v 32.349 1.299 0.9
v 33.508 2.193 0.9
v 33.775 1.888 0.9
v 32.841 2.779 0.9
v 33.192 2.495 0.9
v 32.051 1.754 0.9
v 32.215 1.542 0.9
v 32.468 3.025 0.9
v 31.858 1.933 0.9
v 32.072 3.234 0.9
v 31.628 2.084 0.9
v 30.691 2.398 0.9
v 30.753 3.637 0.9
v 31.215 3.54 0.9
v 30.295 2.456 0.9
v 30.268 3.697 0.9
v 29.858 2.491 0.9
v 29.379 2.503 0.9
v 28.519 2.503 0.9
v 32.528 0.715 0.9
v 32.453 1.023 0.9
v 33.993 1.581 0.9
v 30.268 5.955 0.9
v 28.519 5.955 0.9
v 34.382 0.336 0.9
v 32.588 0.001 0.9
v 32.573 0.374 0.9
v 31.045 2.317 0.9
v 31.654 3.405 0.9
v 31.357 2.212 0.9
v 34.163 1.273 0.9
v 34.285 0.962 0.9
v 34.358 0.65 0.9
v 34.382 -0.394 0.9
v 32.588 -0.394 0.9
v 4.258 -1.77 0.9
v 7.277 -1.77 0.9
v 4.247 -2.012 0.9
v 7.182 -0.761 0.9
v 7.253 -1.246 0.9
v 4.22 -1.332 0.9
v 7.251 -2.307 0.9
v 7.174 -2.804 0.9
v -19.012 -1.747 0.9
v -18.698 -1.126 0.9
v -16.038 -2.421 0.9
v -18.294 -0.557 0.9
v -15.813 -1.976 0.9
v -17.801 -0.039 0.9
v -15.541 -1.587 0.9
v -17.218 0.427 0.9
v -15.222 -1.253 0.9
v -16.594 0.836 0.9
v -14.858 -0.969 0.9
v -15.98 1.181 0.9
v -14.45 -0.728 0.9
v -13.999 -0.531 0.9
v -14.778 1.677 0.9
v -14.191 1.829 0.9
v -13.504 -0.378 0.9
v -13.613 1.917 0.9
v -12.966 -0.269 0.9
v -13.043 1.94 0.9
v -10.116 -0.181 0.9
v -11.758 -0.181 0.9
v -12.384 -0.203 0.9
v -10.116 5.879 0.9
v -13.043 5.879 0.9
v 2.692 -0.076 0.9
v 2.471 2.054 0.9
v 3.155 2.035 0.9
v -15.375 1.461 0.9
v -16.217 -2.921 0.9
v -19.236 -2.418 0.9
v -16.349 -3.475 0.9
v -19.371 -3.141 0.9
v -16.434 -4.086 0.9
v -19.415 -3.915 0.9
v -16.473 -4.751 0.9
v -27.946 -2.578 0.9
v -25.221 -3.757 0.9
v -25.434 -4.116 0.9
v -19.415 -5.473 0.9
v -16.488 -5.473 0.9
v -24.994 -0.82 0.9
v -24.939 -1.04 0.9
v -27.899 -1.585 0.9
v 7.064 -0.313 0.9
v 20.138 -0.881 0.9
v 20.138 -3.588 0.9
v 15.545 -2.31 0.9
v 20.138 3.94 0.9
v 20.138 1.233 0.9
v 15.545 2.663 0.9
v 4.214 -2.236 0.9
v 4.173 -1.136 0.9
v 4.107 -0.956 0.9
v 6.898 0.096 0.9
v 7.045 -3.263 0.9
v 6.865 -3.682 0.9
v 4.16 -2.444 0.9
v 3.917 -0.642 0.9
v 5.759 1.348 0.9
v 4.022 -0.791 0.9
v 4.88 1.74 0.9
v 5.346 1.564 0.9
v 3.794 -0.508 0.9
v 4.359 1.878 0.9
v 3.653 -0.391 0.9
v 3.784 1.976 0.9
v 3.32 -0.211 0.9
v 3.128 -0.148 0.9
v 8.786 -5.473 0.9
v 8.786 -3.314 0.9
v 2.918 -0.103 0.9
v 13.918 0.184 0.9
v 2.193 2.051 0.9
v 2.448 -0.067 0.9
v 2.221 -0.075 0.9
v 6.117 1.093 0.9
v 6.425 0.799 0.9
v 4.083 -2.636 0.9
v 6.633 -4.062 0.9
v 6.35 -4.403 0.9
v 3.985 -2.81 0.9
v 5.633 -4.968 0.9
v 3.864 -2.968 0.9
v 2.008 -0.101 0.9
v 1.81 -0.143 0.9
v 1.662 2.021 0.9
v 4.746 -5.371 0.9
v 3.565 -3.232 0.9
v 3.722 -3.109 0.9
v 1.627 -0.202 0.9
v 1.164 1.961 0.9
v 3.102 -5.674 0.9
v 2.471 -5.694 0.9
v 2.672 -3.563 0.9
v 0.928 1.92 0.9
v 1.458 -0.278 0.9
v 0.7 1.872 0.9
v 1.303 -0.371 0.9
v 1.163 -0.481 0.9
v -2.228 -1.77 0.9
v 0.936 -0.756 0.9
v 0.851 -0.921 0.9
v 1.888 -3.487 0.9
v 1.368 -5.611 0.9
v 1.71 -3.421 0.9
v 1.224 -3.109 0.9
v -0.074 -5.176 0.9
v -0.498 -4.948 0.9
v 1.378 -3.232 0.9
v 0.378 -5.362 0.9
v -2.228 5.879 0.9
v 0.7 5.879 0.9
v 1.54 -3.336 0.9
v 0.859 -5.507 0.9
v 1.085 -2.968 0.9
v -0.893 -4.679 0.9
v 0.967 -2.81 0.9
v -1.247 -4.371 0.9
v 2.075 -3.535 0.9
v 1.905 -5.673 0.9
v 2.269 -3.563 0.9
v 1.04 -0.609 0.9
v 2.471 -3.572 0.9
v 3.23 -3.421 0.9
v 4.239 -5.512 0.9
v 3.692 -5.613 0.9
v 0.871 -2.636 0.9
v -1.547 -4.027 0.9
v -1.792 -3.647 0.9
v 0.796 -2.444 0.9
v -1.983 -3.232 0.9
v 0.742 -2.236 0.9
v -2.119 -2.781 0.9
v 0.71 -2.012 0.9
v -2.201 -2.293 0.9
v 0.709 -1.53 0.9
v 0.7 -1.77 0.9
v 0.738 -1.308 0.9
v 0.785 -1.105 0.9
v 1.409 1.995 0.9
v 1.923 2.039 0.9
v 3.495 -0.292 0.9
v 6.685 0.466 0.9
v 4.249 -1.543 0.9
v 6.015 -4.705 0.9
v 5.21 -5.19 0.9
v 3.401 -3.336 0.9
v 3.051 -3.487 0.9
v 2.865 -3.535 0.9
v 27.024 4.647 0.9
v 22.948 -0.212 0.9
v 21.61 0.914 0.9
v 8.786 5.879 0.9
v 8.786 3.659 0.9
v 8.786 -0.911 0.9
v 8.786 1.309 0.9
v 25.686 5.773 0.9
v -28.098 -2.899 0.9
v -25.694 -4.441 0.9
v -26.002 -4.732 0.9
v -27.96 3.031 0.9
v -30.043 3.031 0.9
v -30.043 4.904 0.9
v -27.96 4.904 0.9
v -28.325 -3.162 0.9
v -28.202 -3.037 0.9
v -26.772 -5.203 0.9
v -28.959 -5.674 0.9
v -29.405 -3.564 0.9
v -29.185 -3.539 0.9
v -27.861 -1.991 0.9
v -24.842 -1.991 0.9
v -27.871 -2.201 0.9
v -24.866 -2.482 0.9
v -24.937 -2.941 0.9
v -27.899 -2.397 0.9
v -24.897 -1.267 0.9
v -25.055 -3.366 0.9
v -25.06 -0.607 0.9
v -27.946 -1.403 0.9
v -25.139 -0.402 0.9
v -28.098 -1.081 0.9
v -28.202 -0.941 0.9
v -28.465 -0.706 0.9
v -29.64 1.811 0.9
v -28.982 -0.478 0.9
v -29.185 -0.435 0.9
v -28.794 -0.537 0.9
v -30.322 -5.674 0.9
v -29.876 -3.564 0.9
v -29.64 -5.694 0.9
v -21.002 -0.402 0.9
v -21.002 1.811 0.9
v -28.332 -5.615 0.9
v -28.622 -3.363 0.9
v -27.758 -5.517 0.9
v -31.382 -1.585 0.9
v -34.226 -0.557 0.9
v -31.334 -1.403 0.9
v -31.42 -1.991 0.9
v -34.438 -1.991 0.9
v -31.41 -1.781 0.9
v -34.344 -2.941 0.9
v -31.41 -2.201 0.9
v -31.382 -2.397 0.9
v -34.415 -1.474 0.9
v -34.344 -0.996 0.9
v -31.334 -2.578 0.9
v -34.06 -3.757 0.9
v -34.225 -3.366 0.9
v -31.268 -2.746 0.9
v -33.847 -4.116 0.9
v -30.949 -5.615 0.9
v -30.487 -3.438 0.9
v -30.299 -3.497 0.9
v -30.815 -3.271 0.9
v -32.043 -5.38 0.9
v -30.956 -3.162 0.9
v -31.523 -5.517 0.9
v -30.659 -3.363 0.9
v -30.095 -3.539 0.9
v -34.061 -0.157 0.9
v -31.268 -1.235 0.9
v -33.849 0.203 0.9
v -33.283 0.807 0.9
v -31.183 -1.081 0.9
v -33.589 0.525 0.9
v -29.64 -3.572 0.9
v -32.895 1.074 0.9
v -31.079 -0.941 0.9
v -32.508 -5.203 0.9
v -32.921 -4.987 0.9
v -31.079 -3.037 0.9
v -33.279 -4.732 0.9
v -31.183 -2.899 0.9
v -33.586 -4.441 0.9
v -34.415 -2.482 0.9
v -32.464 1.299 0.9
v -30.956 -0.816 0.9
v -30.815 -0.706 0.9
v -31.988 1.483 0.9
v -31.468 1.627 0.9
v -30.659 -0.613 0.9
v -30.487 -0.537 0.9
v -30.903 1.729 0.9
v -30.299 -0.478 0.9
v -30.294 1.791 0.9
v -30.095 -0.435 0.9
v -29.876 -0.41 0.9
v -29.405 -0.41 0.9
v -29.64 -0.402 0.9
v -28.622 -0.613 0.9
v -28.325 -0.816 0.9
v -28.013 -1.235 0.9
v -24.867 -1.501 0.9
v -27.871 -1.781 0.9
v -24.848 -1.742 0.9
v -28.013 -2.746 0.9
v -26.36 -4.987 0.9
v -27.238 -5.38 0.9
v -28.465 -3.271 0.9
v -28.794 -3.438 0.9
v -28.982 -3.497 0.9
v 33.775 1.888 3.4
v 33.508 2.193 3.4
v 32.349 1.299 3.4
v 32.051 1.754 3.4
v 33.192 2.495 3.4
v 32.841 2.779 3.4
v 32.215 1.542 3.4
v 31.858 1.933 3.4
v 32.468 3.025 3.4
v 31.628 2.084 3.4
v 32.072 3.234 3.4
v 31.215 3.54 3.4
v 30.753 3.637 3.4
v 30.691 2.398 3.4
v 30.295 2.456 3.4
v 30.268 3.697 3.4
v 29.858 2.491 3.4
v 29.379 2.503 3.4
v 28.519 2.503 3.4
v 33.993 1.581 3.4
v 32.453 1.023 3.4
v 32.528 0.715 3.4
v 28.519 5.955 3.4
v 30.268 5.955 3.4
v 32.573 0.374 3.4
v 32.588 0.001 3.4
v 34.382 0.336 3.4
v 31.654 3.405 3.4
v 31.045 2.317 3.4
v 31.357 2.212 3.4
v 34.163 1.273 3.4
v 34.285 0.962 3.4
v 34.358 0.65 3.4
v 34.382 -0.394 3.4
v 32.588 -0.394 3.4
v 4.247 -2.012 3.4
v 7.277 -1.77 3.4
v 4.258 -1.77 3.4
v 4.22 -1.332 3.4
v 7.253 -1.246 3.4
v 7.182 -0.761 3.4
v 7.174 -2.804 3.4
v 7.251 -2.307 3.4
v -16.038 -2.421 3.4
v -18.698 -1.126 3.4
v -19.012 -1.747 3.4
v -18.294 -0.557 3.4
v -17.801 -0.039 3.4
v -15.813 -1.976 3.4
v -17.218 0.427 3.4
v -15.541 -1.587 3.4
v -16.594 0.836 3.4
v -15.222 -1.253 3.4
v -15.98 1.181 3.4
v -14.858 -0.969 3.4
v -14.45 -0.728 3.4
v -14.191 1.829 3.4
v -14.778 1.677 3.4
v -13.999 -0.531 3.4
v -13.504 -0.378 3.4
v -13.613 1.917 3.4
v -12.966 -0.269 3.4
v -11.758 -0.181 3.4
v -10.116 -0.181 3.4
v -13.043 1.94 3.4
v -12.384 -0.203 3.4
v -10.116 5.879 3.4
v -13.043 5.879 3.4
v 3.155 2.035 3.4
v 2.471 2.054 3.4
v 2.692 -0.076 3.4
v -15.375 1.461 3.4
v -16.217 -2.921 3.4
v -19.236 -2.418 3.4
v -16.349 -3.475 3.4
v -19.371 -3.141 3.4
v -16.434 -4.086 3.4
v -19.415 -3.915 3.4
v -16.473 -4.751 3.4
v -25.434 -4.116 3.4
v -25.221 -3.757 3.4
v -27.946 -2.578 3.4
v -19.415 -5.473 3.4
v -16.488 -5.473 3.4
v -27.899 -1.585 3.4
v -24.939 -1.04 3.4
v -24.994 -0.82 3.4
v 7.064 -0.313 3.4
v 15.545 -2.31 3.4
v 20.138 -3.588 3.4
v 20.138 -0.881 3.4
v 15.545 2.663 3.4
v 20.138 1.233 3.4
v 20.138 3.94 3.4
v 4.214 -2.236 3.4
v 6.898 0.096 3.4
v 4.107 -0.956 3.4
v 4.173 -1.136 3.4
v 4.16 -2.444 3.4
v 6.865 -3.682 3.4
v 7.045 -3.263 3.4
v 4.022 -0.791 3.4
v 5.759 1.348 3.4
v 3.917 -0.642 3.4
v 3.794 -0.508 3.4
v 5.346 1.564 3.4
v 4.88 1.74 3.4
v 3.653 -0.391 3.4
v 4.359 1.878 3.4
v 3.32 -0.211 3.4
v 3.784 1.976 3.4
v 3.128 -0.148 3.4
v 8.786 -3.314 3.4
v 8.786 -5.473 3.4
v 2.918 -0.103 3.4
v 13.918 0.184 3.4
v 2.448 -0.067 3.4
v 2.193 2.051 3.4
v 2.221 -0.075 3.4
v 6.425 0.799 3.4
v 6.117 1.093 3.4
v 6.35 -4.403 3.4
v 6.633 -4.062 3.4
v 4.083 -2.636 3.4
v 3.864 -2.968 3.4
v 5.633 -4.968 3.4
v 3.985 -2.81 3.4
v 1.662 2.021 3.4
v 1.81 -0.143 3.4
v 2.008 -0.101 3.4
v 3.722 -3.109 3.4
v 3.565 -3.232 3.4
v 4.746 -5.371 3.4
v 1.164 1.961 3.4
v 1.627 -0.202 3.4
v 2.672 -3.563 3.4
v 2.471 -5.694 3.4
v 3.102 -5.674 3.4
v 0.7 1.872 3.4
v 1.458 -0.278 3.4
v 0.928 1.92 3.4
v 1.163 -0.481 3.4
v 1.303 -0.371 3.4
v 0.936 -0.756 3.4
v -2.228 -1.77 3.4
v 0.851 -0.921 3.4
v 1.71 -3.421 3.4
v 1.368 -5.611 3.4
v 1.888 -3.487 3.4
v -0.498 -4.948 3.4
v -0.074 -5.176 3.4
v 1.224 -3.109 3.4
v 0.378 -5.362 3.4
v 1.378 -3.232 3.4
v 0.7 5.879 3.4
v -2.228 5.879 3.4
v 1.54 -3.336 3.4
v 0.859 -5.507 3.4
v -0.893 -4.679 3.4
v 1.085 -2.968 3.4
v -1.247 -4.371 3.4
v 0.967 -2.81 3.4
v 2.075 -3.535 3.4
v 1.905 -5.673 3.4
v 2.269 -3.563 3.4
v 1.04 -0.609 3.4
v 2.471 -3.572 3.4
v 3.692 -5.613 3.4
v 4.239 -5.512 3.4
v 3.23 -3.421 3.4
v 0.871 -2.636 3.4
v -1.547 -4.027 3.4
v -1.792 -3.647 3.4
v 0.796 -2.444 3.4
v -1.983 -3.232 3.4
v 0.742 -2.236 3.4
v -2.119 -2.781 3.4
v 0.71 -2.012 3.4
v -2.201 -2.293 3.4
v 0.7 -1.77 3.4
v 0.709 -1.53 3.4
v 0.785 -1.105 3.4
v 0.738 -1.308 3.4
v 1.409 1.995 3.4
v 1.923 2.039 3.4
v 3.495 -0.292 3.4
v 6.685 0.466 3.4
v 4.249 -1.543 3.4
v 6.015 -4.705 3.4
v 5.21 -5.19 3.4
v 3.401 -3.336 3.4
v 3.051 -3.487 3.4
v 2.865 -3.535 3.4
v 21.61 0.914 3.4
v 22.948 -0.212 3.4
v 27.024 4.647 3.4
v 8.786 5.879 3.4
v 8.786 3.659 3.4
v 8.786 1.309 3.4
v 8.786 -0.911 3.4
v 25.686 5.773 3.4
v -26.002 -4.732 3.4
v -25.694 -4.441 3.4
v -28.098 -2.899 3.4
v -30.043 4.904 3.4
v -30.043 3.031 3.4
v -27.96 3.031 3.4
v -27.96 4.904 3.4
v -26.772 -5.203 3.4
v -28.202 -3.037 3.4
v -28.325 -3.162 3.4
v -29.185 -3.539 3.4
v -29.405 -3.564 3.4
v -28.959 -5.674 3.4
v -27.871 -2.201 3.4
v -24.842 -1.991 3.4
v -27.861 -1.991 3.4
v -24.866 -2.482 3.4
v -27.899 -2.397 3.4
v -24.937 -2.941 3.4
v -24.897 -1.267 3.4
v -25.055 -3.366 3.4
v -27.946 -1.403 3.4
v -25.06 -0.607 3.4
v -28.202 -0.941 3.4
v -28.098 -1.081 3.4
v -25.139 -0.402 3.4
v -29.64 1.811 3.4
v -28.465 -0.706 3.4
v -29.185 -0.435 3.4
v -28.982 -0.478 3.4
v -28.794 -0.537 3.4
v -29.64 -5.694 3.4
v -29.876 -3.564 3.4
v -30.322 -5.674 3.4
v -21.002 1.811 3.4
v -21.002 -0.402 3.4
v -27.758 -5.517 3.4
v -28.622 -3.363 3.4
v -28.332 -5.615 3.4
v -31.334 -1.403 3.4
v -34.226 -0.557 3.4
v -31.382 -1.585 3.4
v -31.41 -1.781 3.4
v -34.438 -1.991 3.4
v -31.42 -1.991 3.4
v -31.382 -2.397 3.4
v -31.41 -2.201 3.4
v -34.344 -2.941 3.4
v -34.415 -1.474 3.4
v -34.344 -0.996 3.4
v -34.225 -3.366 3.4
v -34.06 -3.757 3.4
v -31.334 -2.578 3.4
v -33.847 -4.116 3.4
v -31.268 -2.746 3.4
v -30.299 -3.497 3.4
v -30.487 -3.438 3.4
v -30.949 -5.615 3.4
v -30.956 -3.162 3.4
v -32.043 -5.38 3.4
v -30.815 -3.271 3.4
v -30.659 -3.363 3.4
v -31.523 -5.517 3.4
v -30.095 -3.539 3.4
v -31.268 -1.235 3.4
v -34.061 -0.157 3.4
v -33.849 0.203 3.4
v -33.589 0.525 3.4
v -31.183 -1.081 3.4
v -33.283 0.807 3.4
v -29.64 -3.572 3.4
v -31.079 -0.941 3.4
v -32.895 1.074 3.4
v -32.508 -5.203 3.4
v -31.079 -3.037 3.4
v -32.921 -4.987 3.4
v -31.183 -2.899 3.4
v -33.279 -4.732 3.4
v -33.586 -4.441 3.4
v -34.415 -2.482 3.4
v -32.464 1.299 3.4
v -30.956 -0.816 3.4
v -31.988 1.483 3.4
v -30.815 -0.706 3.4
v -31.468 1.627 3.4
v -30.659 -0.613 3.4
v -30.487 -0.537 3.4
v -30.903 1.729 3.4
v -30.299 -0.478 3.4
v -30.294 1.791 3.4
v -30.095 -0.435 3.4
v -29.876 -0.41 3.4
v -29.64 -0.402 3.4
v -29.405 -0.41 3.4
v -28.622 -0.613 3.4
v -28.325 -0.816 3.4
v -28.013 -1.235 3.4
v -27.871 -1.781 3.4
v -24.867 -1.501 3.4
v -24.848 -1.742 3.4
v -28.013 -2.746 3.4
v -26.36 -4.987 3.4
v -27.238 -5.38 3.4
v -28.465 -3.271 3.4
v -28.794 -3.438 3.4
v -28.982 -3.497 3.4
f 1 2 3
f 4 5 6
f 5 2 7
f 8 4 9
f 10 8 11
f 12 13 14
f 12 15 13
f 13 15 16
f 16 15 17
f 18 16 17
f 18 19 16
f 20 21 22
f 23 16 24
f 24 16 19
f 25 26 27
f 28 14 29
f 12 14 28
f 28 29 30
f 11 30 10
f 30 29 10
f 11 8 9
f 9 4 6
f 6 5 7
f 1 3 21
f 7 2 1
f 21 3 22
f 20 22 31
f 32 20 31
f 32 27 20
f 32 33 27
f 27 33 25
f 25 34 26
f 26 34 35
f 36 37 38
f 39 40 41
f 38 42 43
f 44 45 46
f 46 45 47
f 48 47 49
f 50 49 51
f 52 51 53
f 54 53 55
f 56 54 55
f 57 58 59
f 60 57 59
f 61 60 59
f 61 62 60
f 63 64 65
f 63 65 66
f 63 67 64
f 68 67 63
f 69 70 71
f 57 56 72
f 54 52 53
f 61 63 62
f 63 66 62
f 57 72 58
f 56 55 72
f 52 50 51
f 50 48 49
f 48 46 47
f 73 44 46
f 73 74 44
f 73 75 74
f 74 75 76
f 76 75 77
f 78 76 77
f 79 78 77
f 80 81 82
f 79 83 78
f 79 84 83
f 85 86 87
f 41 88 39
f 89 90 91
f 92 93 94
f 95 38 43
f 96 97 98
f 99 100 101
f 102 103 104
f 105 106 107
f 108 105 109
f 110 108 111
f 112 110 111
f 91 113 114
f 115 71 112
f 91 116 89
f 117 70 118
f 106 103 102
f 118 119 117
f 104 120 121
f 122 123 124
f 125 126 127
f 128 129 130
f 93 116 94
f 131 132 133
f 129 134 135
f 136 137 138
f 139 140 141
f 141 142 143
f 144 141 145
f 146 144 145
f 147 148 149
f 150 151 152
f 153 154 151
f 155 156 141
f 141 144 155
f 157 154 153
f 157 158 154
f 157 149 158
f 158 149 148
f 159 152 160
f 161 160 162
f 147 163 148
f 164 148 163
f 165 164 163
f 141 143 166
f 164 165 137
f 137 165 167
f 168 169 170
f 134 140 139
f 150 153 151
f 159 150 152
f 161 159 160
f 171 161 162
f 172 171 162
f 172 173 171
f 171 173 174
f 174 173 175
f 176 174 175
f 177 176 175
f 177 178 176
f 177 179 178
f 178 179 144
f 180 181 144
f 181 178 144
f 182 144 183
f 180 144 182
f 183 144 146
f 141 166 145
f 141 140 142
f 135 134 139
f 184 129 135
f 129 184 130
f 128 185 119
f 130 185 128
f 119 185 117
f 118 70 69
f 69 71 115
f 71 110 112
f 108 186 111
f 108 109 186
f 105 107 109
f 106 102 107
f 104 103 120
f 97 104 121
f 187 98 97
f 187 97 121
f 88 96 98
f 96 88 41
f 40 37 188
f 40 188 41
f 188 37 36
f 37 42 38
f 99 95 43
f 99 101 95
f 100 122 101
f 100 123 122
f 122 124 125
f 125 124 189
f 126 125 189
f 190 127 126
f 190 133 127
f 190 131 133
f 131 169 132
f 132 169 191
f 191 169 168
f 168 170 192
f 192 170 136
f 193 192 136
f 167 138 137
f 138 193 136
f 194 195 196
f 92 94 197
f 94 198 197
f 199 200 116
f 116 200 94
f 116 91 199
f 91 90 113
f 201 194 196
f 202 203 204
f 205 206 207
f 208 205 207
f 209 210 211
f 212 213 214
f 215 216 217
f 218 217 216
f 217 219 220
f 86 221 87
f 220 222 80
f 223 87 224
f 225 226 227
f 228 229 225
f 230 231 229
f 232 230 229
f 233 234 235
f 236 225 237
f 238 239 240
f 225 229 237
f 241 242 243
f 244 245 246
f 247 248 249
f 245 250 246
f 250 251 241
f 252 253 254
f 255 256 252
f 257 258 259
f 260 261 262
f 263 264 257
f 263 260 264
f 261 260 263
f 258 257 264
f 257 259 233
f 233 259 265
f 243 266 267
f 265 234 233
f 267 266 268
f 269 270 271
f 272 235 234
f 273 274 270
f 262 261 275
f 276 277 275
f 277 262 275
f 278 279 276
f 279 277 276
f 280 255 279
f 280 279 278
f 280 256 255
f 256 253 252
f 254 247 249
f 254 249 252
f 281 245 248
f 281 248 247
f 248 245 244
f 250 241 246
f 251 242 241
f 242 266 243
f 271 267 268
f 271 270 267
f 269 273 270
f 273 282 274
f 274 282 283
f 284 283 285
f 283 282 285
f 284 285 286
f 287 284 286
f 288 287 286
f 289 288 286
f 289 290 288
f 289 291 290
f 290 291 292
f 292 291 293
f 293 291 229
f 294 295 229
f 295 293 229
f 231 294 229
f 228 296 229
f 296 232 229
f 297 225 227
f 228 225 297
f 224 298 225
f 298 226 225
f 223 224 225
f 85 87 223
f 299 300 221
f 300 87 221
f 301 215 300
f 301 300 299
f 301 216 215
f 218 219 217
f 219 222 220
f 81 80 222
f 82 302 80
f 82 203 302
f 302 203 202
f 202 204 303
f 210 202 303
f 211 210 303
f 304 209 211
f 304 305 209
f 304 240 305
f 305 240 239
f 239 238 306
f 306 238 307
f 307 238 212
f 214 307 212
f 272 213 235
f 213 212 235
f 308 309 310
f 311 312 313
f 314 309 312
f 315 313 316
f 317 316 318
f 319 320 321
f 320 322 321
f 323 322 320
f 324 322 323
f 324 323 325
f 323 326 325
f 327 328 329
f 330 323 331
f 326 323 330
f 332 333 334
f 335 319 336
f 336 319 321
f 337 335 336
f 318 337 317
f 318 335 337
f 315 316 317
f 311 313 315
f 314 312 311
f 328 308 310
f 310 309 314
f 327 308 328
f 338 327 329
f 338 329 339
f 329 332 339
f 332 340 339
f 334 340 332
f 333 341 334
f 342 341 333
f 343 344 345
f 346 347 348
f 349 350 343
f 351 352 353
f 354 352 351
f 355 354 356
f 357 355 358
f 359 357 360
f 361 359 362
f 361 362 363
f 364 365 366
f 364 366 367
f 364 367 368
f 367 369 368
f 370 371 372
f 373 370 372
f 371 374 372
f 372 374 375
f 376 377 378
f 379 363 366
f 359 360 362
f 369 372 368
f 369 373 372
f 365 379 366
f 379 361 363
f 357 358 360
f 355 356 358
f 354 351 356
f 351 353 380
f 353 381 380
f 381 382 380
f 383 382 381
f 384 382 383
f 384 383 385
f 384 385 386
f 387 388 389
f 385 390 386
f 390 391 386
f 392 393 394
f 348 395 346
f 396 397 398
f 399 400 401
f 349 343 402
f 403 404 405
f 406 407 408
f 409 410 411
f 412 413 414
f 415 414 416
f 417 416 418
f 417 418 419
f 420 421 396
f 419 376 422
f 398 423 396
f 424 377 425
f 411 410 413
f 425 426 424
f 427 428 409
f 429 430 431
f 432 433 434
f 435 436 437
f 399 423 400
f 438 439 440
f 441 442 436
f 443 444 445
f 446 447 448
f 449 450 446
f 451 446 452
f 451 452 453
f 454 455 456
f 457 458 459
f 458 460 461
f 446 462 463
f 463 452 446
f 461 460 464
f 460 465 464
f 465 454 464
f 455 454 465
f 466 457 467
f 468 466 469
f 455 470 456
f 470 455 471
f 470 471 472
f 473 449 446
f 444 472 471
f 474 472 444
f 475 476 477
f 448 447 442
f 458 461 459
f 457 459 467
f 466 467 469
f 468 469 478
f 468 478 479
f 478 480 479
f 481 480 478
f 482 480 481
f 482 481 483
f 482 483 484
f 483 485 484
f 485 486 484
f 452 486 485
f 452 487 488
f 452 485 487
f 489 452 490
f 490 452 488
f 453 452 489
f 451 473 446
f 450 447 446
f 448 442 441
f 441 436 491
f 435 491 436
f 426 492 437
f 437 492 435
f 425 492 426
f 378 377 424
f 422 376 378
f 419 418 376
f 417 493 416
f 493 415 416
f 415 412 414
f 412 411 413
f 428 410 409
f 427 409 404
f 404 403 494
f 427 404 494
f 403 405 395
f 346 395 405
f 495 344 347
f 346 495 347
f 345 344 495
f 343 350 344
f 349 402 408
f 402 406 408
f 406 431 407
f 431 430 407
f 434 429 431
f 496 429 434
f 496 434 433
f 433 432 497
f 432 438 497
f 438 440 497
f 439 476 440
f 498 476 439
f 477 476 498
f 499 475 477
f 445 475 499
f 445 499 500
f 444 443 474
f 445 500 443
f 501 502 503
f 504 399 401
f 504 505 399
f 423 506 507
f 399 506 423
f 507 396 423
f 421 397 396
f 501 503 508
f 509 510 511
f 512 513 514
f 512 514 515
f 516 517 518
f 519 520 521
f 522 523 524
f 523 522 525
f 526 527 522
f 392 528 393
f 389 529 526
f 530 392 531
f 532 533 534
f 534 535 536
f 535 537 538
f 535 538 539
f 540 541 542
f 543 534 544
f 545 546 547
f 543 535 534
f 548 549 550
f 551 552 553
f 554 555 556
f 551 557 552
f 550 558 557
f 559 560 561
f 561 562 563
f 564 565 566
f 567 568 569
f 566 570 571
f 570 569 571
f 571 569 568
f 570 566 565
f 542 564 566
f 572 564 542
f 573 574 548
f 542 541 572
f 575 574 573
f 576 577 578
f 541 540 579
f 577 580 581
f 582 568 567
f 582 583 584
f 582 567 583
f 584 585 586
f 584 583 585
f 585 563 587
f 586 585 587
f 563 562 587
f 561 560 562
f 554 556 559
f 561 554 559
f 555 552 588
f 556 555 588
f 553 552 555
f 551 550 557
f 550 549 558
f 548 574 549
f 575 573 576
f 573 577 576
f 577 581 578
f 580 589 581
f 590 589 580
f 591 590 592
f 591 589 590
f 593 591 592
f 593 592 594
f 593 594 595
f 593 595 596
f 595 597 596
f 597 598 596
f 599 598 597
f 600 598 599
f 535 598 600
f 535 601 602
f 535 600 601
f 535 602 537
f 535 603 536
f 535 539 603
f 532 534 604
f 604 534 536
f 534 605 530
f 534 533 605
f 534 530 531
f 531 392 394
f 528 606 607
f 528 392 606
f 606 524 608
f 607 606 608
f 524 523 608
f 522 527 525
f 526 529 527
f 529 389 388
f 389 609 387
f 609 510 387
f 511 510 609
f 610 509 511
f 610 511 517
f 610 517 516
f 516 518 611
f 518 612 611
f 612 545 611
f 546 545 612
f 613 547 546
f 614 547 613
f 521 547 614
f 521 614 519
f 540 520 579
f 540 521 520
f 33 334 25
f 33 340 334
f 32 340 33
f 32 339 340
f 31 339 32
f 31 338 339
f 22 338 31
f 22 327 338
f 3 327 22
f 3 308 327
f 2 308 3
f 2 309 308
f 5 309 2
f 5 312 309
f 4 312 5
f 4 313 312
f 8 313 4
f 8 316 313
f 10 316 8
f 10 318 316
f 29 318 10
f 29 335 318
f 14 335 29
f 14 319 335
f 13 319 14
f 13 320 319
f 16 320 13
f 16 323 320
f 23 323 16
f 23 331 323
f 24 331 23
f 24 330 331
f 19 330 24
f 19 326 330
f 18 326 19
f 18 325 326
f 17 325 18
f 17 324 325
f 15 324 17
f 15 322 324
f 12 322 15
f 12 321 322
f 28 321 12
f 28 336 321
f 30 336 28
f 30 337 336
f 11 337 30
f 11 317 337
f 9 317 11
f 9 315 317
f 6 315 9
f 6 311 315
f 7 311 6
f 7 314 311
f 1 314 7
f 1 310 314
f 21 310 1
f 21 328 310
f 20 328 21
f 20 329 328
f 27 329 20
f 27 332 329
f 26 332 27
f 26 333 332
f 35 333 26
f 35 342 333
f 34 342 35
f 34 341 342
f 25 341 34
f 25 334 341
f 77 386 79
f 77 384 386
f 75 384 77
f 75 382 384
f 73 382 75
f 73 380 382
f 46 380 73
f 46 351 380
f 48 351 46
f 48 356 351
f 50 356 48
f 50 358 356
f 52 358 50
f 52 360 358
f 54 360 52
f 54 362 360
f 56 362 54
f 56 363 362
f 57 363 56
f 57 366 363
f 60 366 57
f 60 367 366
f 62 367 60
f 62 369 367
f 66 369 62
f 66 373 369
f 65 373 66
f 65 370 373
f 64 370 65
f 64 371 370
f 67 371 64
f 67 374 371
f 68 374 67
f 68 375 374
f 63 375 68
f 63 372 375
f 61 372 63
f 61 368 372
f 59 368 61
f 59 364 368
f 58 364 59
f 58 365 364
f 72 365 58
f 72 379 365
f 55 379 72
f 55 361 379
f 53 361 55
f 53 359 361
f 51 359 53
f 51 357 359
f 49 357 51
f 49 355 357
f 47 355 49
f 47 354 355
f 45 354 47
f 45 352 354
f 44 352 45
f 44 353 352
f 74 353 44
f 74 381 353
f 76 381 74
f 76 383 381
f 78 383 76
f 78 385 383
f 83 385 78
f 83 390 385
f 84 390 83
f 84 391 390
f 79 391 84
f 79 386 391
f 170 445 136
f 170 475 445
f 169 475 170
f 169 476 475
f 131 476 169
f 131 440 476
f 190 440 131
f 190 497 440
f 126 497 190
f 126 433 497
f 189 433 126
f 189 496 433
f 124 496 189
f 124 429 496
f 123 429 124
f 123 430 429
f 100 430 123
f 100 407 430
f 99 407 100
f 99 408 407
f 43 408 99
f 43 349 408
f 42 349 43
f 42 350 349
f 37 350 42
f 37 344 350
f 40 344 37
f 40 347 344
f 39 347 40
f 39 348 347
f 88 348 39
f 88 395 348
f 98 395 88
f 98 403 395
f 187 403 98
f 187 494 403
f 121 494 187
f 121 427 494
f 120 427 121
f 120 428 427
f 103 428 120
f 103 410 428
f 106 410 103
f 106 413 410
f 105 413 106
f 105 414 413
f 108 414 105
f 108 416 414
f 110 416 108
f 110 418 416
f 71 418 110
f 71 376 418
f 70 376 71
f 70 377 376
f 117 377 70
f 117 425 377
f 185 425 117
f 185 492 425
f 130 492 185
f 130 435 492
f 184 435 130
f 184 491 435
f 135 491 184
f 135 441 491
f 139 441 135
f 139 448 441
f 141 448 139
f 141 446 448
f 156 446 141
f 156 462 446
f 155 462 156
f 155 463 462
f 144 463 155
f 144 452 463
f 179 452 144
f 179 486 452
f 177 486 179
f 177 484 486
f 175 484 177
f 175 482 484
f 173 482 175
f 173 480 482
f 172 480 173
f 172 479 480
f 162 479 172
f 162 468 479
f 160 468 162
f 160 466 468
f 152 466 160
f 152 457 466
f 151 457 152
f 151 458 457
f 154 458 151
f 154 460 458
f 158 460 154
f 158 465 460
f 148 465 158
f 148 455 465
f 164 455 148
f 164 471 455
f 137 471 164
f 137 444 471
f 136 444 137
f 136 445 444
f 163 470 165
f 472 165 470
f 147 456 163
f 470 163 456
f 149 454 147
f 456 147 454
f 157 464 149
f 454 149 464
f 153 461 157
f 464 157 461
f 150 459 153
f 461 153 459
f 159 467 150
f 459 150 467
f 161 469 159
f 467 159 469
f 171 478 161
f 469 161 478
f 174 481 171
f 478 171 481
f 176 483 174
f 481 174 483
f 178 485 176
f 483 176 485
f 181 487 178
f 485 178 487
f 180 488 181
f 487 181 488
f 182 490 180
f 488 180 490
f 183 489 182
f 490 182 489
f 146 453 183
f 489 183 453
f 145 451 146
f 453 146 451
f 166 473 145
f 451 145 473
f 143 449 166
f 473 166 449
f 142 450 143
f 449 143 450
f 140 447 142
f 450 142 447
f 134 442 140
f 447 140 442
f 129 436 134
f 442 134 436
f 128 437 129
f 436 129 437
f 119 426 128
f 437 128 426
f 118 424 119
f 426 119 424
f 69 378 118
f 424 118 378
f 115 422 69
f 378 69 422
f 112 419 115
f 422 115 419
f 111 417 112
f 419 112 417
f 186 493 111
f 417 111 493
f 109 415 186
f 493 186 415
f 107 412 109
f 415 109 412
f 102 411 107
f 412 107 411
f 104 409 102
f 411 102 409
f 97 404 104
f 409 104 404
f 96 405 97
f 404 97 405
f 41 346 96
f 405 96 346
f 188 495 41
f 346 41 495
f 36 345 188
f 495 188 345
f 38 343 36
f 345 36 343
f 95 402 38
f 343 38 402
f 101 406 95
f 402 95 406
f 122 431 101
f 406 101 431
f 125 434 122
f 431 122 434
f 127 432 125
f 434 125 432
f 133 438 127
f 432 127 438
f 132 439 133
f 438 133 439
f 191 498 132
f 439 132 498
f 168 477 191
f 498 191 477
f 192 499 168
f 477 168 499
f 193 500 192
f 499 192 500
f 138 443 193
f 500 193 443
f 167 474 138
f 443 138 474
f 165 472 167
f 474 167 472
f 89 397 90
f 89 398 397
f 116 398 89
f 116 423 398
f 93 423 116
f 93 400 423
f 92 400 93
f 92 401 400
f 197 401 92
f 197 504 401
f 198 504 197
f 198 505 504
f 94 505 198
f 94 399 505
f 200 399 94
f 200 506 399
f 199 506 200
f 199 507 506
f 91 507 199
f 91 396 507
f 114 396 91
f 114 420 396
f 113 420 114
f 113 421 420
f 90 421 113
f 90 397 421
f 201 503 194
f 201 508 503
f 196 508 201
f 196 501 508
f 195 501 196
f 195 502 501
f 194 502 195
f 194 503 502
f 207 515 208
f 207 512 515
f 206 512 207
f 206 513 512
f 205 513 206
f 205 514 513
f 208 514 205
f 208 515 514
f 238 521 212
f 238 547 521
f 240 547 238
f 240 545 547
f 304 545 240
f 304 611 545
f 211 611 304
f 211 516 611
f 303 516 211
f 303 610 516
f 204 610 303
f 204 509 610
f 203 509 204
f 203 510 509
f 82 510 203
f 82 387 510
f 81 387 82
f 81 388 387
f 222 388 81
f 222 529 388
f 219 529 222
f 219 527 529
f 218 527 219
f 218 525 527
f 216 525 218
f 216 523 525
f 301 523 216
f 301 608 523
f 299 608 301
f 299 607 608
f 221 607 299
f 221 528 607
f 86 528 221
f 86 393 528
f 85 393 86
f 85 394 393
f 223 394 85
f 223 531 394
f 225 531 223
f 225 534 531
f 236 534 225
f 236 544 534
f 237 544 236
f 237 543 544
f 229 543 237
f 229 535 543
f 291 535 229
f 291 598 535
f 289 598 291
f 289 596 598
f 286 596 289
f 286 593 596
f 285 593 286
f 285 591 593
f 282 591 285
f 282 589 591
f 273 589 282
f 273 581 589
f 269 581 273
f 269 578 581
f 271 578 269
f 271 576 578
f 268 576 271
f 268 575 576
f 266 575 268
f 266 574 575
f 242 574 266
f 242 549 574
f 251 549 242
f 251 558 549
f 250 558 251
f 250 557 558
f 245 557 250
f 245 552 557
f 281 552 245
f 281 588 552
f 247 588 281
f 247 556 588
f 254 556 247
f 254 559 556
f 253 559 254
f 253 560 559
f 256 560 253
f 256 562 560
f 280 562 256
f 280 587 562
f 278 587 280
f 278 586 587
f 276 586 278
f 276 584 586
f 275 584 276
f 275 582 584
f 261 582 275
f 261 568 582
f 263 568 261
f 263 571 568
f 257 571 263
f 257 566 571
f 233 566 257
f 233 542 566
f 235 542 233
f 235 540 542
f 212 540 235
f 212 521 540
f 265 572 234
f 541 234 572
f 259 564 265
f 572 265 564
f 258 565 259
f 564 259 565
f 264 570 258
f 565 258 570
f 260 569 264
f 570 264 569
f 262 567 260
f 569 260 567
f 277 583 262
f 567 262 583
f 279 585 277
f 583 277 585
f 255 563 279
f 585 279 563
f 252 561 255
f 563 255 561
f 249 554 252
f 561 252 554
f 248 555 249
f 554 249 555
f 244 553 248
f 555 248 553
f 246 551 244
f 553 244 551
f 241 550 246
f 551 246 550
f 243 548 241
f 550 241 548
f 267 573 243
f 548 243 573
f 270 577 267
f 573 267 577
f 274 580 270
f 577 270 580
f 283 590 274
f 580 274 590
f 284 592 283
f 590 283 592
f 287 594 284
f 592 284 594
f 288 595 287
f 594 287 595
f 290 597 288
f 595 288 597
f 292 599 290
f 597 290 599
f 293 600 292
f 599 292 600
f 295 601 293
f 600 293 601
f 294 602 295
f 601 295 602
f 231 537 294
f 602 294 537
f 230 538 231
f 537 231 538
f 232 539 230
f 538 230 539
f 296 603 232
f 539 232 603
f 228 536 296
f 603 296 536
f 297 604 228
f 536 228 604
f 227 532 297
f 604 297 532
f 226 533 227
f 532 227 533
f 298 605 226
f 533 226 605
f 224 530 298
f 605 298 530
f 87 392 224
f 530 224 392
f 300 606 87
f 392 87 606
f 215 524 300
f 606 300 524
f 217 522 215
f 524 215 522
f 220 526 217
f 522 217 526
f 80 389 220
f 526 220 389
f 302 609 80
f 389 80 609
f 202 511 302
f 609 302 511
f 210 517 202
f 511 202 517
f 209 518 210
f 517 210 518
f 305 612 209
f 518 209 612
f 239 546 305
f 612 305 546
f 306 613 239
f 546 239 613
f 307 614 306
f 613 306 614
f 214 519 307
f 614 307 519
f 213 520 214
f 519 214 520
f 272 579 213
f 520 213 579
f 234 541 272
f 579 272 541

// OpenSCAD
$fn = 48;
  // syllabics (overlaid on icon, tallest)
  translate([0, 0.000, 0.900]) linear_extrude(height=2.500) text("ᓃᓱ ᑲᕒᐟᔅ", size=11.213, halign="center", valign="center", font="Euphemia UCAS:style=Bold");
